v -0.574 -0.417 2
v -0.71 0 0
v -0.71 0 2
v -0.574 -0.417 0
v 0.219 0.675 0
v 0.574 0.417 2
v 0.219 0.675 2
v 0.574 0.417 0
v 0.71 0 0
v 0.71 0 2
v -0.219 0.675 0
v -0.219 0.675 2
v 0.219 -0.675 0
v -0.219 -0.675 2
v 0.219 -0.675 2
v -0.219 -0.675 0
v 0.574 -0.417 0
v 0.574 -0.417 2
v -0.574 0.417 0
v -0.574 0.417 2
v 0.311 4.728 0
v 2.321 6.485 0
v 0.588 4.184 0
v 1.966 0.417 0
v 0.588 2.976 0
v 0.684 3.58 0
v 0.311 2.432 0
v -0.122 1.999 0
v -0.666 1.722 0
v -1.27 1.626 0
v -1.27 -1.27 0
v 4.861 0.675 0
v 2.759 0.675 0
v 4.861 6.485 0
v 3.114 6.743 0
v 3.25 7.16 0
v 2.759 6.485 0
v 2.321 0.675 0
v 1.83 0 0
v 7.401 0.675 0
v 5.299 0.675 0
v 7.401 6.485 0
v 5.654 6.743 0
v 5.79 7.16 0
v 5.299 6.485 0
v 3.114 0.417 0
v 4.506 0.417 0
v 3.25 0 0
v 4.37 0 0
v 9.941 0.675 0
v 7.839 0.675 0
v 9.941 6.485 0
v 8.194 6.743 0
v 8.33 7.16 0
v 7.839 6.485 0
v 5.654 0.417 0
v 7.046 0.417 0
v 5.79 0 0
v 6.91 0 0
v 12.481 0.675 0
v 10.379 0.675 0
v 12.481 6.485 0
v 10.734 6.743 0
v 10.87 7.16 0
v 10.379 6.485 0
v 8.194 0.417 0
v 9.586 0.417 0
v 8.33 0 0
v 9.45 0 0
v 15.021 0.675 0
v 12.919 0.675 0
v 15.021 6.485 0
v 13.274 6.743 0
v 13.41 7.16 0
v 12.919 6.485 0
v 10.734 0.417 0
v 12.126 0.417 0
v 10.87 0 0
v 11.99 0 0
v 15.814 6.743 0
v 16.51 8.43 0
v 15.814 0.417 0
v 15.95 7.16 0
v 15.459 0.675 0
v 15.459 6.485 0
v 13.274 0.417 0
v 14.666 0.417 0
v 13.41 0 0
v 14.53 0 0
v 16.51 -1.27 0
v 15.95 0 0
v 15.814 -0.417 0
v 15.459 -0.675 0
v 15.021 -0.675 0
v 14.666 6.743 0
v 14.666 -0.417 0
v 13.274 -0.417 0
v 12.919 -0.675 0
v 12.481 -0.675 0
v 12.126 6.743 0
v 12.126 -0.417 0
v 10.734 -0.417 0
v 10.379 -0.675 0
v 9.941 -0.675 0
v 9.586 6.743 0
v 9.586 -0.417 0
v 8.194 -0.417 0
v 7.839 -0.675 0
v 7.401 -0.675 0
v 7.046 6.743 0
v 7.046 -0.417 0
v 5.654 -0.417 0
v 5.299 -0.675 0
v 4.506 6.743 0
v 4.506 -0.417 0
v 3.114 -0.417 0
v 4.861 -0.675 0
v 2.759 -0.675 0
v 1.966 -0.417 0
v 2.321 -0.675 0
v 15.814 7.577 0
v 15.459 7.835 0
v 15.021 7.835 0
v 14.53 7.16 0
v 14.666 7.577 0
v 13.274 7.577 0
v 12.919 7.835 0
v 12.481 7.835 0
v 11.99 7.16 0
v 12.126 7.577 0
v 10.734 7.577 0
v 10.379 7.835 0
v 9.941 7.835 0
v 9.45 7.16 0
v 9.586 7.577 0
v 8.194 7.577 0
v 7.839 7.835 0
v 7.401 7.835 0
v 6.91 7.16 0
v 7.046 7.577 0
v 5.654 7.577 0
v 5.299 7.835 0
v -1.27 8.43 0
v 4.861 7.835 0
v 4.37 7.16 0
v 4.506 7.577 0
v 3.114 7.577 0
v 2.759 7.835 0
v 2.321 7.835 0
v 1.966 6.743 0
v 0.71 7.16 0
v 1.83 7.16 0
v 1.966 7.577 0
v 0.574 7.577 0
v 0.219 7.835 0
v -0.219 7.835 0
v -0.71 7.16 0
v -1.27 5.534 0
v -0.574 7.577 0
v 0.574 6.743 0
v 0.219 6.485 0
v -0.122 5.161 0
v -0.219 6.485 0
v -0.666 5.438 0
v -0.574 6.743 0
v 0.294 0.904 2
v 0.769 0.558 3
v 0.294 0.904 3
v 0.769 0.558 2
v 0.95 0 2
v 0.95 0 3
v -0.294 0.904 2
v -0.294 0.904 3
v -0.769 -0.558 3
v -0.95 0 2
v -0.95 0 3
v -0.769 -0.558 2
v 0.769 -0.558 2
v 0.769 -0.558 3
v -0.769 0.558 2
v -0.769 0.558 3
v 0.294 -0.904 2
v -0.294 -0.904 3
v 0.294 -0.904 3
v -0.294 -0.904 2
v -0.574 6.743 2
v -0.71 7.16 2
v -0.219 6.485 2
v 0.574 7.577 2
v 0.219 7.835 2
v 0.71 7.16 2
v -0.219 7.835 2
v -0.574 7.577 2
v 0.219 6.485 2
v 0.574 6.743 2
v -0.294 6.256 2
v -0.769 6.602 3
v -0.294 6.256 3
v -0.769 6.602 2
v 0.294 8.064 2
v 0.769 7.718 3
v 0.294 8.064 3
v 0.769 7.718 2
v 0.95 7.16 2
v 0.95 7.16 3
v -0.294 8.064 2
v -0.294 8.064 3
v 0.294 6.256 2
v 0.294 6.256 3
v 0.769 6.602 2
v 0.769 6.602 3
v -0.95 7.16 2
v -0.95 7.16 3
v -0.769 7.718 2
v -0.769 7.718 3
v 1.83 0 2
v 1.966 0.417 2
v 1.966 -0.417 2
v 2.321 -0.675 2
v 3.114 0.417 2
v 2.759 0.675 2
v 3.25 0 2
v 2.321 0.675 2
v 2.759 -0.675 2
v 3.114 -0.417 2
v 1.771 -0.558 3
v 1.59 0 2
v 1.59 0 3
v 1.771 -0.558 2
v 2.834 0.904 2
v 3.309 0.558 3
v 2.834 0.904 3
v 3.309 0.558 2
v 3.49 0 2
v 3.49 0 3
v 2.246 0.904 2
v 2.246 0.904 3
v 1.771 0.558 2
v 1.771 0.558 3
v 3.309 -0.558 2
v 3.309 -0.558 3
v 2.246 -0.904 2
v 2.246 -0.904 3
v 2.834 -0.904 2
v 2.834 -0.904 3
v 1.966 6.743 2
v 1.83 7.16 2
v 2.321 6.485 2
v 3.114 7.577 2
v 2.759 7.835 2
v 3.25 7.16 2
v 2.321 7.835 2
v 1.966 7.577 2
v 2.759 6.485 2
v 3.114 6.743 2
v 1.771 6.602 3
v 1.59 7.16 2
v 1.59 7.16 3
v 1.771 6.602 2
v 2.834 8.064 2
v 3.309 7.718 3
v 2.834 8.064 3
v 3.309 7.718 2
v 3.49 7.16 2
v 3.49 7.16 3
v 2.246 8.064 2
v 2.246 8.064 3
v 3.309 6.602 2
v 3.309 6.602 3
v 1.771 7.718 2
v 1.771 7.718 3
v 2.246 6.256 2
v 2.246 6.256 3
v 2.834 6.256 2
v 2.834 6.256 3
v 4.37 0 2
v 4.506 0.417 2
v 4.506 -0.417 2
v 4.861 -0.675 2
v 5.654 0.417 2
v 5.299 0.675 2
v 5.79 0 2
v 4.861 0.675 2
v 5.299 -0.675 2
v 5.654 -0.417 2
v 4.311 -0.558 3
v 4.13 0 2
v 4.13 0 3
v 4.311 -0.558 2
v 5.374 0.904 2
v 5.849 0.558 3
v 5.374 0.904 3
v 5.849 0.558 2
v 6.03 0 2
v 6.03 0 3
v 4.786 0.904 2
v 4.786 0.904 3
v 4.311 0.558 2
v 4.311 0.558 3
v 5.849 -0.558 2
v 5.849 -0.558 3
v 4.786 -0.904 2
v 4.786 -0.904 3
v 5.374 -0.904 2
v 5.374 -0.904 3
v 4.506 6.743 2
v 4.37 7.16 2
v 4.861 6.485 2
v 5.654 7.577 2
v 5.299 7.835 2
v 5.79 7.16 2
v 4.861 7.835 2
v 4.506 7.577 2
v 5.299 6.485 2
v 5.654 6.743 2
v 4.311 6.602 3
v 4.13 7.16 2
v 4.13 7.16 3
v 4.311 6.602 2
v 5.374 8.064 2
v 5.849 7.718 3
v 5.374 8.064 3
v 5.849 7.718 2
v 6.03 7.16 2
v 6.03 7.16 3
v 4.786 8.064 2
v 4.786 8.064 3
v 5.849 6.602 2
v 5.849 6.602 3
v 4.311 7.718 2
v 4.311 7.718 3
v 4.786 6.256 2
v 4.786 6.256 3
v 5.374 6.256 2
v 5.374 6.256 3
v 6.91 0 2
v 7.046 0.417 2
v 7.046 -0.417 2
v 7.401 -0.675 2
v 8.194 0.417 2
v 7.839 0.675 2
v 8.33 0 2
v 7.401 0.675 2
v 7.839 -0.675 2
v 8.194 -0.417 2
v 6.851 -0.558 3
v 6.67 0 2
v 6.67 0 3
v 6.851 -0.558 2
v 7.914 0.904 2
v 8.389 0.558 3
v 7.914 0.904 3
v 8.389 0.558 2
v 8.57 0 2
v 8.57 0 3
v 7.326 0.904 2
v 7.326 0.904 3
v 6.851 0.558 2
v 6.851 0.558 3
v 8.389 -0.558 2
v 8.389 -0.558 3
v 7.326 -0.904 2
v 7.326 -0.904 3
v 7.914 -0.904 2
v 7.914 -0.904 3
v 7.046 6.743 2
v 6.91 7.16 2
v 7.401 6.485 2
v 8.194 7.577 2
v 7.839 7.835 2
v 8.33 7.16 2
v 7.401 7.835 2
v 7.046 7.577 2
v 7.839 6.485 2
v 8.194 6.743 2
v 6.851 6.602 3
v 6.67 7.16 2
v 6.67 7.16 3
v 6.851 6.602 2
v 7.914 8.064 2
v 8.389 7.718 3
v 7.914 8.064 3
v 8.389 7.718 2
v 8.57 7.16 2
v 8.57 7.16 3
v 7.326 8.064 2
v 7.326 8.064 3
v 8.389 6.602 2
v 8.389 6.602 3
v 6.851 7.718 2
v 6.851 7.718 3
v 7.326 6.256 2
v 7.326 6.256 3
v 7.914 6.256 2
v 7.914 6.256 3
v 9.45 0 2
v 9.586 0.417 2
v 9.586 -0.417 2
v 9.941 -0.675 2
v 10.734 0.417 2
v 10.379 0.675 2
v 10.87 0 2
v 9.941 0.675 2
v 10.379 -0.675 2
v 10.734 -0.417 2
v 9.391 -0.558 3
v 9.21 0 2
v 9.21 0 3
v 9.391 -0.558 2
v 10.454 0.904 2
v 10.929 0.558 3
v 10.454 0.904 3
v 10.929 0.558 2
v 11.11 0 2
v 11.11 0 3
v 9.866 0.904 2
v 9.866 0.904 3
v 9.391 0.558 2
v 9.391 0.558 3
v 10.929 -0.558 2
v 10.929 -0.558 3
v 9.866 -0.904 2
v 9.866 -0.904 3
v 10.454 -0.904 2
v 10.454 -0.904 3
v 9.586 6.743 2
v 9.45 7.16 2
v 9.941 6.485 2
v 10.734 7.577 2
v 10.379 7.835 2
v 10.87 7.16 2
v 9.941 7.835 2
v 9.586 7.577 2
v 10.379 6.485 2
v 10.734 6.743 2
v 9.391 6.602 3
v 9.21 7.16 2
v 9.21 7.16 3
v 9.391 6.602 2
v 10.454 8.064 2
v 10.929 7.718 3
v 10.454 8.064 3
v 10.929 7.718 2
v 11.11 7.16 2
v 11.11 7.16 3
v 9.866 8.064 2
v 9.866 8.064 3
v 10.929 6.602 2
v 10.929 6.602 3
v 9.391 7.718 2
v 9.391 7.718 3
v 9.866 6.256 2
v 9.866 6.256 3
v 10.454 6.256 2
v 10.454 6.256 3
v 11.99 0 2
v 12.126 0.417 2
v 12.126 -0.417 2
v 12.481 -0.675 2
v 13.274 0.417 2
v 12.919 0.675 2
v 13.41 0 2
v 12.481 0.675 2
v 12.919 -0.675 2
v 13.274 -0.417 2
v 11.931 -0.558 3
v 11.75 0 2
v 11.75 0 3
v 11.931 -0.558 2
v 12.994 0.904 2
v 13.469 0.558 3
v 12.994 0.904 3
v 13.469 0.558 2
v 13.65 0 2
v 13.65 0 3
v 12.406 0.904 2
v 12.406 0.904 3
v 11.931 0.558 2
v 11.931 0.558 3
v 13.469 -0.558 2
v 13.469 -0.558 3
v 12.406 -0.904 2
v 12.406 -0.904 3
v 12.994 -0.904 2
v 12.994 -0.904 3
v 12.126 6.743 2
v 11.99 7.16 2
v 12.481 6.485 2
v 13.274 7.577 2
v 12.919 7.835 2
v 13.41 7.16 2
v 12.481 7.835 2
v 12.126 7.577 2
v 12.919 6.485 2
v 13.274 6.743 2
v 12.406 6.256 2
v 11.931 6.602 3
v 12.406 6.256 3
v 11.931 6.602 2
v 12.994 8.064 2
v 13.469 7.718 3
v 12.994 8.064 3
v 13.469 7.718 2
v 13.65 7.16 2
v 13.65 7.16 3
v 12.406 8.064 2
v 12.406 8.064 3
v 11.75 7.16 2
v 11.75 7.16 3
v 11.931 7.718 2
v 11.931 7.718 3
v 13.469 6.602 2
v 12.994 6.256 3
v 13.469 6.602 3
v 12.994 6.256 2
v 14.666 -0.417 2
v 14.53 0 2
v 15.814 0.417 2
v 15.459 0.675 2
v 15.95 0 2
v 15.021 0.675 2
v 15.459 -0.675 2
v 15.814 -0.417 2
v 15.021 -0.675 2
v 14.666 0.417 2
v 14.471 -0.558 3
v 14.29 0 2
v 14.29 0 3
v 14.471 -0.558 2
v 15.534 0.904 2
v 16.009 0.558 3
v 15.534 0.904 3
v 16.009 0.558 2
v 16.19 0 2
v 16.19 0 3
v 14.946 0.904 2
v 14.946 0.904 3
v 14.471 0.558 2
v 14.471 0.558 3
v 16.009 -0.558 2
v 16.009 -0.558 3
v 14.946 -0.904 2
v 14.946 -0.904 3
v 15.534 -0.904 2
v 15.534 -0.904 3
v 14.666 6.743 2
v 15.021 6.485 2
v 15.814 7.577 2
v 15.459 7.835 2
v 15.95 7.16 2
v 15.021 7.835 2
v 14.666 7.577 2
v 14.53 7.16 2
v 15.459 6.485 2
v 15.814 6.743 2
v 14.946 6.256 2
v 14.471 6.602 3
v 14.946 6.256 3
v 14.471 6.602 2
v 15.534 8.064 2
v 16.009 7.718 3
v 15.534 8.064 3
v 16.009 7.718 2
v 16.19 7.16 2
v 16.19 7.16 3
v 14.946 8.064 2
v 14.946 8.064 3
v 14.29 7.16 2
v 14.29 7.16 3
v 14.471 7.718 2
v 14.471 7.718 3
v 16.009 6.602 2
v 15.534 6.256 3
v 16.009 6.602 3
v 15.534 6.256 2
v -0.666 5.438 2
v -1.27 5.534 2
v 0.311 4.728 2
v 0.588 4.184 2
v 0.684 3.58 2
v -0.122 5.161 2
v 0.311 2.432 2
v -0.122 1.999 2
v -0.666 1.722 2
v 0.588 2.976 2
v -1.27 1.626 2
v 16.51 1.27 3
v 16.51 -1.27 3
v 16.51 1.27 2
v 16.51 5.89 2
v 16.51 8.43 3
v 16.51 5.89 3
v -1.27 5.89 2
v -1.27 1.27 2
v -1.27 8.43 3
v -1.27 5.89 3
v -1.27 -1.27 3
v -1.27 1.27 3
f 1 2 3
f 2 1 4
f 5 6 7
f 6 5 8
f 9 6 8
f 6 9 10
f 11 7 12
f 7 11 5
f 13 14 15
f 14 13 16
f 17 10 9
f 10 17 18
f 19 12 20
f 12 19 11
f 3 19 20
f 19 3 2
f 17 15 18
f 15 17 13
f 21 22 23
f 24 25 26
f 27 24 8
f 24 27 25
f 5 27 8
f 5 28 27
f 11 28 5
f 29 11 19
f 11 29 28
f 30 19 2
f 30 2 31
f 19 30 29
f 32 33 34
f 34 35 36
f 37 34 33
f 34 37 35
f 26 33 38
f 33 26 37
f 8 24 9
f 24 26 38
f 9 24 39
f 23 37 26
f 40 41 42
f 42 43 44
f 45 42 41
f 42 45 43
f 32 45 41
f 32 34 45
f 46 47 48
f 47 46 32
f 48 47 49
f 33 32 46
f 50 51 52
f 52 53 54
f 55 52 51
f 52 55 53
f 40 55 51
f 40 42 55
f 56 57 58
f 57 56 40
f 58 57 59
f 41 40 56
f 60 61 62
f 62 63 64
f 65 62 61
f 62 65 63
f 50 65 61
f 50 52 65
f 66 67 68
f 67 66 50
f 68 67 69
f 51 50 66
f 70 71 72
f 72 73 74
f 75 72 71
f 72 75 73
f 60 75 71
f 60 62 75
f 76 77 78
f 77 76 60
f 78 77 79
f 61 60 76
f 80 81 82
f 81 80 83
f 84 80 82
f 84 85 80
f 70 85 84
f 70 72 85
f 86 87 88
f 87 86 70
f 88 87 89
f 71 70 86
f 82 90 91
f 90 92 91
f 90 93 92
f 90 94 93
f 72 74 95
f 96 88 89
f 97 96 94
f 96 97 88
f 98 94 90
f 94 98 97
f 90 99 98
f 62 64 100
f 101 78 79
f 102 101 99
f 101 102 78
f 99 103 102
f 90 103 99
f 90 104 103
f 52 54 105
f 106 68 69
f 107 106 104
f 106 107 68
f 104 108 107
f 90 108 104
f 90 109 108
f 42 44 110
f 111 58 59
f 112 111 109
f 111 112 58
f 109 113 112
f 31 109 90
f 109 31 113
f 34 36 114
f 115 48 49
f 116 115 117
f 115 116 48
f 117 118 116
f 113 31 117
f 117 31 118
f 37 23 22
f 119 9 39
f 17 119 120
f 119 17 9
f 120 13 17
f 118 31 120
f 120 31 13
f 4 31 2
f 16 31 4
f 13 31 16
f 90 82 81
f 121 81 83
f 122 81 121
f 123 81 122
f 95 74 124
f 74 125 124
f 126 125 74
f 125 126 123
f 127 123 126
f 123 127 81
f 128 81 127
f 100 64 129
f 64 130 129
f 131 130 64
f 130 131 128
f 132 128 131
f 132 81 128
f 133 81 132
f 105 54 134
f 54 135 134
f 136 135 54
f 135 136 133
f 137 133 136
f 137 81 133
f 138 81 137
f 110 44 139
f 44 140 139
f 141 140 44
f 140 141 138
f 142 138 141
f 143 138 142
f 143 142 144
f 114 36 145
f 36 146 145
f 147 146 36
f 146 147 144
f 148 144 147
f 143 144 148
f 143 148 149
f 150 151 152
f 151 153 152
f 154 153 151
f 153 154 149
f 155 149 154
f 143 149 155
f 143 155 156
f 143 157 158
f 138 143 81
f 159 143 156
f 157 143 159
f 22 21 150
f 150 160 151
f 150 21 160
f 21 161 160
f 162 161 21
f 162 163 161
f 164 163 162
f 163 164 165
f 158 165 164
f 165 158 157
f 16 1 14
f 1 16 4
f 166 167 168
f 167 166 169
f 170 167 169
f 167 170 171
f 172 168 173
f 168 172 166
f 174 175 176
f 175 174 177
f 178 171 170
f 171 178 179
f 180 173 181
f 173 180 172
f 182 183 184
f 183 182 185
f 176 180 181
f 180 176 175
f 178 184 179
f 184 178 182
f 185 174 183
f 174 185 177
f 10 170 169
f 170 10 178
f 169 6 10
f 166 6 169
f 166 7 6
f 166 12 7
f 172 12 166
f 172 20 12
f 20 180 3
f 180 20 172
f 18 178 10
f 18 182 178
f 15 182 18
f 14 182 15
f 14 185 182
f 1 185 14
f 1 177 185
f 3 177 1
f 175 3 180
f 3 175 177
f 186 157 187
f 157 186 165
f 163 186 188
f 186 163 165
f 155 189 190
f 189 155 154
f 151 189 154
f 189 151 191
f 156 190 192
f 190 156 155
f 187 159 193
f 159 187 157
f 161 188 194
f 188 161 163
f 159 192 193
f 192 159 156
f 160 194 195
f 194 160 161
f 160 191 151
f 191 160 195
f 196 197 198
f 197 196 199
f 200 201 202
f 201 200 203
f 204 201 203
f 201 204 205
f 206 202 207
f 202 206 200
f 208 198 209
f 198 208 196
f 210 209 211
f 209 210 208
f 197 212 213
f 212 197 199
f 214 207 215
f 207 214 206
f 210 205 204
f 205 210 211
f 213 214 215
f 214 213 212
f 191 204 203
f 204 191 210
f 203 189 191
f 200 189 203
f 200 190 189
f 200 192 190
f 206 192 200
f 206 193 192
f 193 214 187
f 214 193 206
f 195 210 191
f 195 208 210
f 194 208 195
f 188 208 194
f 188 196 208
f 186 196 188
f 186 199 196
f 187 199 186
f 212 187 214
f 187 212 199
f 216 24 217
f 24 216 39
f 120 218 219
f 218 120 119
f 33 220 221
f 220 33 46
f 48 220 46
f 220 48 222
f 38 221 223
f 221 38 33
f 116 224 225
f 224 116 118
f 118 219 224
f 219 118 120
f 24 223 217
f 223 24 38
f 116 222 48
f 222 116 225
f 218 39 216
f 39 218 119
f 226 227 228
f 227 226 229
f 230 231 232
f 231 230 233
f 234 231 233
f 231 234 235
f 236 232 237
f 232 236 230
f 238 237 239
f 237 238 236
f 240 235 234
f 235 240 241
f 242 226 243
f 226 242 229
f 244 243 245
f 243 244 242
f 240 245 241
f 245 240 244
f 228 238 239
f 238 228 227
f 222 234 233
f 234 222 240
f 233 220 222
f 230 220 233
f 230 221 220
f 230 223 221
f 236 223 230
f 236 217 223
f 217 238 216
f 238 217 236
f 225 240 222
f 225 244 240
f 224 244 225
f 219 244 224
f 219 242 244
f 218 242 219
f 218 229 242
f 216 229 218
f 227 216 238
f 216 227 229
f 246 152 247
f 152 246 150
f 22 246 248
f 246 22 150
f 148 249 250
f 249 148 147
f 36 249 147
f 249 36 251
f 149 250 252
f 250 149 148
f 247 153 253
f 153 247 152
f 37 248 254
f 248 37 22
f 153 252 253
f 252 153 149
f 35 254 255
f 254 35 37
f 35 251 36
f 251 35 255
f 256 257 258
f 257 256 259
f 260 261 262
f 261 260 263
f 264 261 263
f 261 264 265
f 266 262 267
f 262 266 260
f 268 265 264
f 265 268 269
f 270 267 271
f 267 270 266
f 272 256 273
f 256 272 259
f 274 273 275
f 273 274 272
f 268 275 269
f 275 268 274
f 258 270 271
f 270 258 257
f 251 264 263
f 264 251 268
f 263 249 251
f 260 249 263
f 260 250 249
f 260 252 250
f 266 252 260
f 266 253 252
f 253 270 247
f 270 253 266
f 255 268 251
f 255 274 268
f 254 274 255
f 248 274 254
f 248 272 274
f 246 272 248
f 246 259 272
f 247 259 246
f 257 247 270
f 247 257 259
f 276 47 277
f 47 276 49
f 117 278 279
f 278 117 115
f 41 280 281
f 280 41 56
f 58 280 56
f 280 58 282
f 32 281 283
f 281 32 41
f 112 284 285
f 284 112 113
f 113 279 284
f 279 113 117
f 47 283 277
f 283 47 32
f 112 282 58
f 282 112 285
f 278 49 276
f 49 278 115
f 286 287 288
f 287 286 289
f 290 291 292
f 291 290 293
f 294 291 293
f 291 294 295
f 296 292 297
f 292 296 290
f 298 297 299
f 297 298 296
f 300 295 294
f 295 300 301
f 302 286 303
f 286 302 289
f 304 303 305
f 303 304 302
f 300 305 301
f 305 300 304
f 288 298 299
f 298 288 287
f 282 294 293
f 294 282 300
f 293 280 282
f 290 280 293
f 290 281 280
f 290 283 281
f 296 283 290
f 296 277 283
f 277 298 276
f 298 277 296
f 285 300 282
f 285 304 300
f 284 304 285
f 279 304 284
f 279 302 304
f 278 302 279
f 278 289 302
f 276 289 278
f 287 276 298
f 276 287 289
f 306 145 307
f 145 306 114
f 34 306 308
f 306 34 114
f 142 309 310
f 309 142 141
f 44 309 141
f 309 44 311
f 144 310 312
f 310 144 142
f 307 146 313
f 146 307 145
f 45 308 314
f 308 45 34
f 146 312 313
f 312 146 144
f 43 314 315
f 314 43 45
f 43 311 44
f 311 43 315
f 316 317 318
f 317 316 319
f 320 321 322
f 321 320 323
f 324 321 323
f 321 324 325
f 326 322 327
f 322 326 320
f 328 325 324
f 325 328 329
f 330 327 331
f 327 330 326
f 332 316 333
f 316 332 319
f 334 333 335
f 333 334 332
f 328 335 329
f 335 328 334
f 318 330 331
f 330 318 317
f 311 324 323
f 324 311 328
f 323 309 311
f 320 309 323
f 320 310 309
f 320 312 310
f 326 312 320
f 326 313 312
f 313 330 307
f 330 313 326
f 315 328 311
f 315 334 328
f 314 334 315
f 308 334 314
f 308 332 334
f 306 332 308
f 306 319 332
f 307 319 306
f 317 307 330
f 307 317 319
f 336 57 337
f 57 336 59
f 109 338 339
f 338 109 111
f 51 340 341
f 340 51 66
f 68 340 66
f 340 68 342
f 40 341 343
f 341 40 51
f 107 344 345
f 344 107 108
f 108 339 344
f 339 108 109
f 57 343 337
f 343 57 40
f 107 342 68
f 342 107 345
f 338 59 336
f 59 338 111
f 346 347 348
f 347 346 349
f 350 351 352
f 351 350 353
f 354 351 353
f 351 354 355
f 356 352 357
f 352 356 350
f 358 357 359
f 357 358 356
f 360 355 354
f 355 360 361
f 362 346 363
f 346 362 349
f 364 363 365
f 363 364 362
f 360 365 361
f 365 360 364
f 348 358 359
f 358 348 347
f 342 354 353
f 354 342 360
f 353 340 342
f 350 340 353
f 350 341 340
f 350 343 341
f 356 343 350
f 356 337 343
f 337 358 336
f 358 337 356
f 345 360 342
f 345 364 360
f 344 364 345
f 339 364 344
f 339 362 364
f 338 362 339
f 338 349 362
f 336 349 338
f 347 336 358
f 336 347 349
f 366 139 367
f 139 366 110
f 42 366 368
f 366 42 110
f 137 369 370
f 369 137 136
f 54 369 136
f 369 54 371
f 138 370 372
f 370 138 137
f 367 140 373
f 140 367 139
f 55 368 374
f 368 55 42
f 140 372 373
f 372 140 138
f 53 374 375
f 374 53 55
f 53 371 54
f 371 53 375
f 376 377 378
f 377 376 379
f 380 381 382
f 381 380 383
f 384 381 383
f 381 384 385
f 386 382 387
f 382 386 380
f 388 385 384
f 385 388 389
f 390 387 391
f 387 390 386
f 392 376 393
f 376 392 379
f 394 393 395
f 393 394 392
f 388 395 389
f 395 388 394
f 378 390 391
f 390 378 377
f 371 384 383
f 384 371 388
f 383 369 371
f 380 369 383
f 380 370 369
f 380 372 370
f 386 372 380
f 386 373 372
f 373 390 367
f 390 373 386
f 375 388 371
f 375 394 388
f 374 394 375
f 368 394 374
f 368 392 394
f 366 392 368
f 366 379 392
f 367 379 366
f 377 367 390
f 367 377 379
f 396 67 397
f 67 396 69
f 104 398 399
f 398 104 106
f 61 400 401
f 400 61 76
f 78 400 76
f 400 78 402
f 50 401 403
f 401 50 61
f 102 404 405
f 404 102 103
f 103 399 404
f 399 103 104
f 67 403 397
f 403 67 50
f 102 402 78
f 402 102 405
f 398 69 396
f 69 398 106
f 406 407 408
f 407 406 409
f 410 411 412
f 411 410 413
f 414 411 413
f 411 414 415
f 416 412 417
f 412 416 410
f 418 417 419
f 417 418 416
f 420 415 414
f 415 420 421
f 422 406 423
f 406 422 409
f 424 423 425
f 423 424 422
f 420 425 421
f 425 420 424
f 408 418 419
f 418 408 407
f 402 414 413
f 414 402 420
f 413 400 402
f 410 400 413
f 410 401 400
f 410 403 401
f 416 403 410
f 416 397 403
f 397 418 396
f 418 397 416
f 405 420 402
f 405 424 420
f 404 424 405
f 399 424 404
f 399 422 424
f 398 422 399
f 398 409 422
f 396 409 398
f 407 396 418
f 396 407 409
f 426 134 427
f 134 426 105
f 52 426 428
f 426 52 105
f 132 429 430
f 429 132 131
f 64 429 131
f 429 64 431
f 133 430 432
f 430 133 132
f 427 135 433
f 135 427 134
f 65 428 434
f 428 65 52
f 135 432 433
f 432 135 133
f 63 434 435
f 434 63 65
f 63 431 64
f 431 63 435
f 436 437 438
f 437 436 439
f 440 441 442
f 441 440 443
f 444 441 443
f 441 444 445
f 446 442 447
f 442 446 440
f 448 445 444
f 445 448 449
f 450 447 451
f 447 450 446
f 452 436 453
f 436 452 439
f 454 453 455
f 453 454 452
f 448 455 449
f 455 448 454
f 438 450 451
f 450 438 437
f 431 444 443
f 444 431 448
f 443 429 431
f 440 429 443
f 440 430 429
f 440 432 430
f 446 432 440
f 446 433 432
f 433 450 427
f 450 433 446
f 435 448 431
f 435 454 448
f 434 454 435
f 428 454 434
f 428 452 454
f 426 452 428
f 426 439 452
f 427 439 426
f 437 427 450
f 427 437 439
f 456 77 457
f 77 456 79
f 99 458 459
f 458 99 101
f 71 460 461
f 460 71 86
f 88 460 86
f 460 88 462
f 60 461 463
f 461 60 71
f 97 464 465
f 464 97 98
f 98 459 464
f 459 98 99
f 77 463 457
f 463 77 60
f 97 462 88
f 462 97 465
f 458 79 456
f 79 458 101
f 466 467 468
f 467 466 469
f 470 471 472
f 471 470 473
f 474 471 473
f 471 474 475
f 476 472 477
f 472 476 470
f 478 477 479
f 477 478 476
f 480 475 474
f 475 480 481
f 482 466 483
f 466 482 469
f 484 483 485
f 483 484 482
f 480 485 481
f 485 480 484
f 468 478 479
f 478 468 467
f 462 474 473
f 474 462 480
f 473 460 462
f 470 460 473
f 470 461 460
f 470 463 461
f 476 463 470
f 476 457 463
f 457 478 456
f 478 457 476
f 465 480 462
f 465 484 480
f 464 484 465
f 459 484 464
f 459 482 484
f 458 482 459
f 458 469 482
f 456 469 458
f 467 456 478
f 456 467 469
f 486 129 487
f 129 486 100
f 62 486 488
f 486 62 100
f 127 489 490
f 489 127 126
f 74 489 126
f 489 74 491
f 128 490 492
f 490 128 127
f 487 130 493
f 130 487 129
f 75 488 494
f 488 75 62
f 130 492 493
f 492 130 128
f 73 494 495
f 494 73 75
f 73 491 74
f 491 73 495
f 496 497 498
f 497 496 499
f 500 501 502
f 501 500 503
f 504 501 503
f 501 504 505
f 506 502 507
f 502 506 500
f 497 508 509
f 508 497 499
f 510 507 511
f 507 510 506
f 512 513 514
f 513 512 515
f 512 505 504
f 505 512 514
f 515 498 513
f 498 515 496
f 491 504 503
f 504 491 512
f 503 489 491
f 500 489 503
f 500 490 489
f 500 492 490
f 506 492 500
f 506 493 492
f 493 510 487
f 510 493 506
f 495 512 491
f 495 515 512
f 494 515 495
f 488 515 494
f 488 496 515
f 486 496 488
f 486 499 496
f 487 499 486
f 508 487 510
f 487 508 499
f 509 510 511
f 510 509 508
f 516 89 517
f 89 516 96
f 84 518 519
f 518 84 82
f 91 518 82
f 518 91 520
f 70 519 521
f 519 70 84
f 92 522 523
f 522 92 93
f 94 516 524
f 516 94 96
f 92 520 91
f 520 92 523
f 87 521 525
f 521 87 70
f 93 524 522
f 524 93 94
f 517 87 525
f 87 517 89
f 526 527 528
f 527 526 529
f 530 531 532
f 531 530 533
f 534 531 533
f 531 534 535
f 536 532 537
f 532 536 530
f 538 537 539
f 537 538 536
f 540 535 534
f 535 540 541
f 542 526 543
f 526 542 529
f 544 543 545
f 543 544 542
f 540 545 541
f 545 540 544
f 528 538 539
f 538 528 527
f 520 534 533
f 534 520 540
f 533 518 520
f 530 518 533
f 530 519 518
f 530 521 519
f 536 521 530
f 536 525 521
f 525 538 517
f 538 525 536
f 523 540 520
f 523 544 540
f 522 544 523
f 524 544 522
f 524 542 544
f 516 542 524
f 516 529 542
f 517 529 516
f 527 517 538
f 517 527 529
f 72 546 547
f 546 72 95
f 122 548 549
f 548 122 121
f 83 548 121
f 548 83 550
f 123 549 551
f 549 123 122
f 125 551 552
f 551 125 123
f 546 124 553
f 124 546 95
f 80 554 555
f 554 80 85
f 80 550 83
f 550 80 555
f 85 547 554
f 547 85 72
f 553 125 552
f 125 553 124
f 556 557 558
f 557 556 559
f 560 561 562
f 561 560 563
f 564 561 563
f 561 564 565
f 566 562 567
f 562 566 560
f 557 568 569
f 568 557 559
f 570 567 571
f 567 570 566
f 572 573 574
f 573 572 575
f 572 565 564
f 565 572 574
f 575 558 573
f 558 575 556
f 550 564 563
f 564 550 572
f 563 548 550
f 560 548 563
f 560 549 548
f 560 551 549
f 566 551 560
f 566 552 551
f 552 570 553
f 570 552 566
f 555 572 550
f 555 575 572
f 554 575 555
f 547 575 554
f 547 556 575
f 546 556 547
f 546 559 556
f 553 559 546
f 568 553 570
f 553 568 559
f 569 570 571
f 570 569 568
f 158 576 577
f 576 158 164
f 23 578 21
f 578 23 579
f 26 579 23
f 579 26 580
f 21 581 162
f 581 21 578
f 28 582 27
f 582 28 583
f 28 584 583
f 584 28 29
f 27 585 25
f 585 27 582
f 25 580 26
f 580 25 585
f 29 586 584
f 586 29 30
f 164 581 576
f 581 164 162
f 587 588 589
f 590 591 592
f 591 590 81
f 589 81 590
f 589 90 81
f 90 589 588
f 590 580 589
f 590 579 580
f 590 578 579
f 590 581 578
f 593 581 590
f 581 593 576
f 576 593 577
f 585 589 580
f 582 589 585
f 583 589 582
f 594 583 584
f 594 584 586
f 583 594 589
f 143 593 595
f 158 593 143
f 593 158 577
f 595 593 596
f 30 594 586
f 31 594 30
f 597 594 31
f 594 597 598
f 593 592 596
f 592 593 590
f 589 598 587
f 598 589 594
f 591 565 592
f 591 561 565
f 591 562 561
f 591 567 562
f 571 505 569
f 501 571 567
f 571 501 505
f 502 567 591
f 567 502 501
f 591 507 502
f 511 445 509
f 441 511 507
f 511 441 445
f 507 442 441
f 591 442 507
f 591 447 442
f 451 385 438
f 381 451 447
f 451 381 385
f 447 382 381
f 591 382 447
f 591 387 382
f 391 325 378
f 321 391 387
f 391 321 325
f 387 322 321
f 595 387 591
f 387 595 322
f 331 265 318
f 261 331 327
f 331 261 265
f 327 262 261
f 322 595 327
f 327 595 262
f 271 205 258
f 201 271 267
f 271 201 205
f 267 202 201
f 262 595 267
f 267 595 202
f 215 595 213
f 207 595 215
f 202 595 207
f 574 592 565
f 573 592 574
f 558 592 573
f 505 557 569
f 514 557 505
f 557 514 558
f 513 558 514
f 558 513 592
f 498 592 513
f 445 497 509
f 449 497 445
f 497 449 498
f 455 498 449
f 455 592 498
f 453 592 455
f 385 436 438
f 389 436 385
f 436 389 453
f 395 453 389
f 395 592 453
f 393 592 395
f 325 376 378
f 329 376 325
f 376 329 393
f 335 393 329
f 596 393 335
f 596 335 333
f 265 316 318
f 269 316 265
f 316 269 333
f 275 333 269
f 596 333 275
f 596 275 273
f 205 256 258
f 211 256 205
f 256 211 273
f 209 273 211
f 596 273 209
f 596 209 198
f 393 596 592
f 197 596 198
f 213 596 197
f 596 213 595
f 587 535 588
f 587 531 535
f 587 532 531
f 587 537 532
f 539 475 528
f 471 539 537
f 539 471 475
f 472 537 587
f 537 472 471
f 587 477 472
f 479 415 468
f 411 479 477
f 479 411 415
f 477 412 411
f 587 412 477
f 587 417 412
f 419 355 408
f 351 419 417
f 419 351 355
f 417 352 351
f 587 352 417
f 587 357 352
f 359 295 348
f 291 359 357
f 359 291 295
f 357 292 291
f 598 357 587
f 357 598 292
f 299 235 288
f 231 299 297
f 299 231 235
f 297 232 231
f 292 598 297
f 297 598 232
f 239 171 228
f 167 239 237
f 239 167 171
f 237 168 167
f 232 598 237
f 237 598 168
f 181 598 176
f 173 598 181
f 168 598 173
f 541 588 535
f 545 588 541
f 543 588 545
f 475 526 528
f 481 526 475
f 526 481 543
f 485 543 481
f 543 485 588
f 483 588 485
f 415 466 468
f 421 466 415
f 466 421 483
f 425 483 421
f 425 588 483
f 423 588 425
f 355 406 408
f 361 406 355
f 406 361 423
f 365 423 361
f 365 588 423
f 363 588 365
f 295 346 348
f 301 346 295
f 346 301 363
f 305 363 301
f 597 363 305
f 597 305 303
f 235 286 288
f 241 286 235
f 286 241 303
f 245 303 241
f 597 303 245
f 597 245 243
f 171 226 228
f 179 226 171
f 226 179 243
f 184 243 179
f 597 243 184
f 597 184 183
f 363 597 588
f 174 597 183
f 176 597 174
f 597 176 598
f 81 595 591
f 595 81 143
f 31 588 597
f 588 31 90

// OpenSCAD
//
// This model is licensed under a
// Creative Commons Attribution-ShareAlike 4.0 International License.
// 
// You should have received a copy of the license along with this
// work. If not, see <http://creativecommons.org/licenses/by-sa/4.0/>.
//

// 
// customizable dip socket
//
// designed to hold standard machined DIP or Wirewrap pins with 1.83mm diameter
//

dip(14, cut=false);


// pins   - number of pins (e.g., 10, 14, 28)
// pitch  - spacing between wholes in the pcb (e.g., 2.45 or 1.27)
// rs     - spacing between pin rows (e.g., 7.62, 10.16, or 15.24)
// cut    - should window be cut in the middle section?

module dip(pins, pitch = 2.54, rs = 7.16, cut = true) {
    h = 3;
    r1 = 1.9/2;  // 1.83 with wiggle room
    r2 = 1.42/2; // 1.35 with wiggle room
    
    difference() {
        translate([-pitch/2,-pitch/2,0]) cube([pitch * pins/2, rs + pitch, h]);
        
        union() {
            // pin 1 indicator cutout
            $fn=20; 
            translate([-pitch/2,rs/2,0]) cylinder(h = h+2, r = pitch/1.3);
            
            // lower middle section cutout
            translate([-pitch/2,pitch/2,h-1]) cube([pitch * pins/2, rs-pitch, 2]);
            
            // pin holes
            for (i = [0:pins/2-1]) {
                $fn=10; 
                cx = i * pitch;
                translate([cx, 0, 0]) cylinder(h = h+1, r = r2);
                translate([cx, 0, h-1]) cylinder(h = h+1, r = r1);
                translate([cx, 0 + rs, 0]) cylinder(h = h+1, r = r2);    
                translate([cx, 0 + rs, h-1]) cylinder(h = h+1, r = r1);    
            }
            
            // "window" cutout
            if (cut && pins >= 12) {
                translate([1.5 * pitch, pitch/2, -1]) cube([(pins / 2 - 3.5) * pitch, rs-pitch, 2*h]);
            }
            
        }
    }
}
